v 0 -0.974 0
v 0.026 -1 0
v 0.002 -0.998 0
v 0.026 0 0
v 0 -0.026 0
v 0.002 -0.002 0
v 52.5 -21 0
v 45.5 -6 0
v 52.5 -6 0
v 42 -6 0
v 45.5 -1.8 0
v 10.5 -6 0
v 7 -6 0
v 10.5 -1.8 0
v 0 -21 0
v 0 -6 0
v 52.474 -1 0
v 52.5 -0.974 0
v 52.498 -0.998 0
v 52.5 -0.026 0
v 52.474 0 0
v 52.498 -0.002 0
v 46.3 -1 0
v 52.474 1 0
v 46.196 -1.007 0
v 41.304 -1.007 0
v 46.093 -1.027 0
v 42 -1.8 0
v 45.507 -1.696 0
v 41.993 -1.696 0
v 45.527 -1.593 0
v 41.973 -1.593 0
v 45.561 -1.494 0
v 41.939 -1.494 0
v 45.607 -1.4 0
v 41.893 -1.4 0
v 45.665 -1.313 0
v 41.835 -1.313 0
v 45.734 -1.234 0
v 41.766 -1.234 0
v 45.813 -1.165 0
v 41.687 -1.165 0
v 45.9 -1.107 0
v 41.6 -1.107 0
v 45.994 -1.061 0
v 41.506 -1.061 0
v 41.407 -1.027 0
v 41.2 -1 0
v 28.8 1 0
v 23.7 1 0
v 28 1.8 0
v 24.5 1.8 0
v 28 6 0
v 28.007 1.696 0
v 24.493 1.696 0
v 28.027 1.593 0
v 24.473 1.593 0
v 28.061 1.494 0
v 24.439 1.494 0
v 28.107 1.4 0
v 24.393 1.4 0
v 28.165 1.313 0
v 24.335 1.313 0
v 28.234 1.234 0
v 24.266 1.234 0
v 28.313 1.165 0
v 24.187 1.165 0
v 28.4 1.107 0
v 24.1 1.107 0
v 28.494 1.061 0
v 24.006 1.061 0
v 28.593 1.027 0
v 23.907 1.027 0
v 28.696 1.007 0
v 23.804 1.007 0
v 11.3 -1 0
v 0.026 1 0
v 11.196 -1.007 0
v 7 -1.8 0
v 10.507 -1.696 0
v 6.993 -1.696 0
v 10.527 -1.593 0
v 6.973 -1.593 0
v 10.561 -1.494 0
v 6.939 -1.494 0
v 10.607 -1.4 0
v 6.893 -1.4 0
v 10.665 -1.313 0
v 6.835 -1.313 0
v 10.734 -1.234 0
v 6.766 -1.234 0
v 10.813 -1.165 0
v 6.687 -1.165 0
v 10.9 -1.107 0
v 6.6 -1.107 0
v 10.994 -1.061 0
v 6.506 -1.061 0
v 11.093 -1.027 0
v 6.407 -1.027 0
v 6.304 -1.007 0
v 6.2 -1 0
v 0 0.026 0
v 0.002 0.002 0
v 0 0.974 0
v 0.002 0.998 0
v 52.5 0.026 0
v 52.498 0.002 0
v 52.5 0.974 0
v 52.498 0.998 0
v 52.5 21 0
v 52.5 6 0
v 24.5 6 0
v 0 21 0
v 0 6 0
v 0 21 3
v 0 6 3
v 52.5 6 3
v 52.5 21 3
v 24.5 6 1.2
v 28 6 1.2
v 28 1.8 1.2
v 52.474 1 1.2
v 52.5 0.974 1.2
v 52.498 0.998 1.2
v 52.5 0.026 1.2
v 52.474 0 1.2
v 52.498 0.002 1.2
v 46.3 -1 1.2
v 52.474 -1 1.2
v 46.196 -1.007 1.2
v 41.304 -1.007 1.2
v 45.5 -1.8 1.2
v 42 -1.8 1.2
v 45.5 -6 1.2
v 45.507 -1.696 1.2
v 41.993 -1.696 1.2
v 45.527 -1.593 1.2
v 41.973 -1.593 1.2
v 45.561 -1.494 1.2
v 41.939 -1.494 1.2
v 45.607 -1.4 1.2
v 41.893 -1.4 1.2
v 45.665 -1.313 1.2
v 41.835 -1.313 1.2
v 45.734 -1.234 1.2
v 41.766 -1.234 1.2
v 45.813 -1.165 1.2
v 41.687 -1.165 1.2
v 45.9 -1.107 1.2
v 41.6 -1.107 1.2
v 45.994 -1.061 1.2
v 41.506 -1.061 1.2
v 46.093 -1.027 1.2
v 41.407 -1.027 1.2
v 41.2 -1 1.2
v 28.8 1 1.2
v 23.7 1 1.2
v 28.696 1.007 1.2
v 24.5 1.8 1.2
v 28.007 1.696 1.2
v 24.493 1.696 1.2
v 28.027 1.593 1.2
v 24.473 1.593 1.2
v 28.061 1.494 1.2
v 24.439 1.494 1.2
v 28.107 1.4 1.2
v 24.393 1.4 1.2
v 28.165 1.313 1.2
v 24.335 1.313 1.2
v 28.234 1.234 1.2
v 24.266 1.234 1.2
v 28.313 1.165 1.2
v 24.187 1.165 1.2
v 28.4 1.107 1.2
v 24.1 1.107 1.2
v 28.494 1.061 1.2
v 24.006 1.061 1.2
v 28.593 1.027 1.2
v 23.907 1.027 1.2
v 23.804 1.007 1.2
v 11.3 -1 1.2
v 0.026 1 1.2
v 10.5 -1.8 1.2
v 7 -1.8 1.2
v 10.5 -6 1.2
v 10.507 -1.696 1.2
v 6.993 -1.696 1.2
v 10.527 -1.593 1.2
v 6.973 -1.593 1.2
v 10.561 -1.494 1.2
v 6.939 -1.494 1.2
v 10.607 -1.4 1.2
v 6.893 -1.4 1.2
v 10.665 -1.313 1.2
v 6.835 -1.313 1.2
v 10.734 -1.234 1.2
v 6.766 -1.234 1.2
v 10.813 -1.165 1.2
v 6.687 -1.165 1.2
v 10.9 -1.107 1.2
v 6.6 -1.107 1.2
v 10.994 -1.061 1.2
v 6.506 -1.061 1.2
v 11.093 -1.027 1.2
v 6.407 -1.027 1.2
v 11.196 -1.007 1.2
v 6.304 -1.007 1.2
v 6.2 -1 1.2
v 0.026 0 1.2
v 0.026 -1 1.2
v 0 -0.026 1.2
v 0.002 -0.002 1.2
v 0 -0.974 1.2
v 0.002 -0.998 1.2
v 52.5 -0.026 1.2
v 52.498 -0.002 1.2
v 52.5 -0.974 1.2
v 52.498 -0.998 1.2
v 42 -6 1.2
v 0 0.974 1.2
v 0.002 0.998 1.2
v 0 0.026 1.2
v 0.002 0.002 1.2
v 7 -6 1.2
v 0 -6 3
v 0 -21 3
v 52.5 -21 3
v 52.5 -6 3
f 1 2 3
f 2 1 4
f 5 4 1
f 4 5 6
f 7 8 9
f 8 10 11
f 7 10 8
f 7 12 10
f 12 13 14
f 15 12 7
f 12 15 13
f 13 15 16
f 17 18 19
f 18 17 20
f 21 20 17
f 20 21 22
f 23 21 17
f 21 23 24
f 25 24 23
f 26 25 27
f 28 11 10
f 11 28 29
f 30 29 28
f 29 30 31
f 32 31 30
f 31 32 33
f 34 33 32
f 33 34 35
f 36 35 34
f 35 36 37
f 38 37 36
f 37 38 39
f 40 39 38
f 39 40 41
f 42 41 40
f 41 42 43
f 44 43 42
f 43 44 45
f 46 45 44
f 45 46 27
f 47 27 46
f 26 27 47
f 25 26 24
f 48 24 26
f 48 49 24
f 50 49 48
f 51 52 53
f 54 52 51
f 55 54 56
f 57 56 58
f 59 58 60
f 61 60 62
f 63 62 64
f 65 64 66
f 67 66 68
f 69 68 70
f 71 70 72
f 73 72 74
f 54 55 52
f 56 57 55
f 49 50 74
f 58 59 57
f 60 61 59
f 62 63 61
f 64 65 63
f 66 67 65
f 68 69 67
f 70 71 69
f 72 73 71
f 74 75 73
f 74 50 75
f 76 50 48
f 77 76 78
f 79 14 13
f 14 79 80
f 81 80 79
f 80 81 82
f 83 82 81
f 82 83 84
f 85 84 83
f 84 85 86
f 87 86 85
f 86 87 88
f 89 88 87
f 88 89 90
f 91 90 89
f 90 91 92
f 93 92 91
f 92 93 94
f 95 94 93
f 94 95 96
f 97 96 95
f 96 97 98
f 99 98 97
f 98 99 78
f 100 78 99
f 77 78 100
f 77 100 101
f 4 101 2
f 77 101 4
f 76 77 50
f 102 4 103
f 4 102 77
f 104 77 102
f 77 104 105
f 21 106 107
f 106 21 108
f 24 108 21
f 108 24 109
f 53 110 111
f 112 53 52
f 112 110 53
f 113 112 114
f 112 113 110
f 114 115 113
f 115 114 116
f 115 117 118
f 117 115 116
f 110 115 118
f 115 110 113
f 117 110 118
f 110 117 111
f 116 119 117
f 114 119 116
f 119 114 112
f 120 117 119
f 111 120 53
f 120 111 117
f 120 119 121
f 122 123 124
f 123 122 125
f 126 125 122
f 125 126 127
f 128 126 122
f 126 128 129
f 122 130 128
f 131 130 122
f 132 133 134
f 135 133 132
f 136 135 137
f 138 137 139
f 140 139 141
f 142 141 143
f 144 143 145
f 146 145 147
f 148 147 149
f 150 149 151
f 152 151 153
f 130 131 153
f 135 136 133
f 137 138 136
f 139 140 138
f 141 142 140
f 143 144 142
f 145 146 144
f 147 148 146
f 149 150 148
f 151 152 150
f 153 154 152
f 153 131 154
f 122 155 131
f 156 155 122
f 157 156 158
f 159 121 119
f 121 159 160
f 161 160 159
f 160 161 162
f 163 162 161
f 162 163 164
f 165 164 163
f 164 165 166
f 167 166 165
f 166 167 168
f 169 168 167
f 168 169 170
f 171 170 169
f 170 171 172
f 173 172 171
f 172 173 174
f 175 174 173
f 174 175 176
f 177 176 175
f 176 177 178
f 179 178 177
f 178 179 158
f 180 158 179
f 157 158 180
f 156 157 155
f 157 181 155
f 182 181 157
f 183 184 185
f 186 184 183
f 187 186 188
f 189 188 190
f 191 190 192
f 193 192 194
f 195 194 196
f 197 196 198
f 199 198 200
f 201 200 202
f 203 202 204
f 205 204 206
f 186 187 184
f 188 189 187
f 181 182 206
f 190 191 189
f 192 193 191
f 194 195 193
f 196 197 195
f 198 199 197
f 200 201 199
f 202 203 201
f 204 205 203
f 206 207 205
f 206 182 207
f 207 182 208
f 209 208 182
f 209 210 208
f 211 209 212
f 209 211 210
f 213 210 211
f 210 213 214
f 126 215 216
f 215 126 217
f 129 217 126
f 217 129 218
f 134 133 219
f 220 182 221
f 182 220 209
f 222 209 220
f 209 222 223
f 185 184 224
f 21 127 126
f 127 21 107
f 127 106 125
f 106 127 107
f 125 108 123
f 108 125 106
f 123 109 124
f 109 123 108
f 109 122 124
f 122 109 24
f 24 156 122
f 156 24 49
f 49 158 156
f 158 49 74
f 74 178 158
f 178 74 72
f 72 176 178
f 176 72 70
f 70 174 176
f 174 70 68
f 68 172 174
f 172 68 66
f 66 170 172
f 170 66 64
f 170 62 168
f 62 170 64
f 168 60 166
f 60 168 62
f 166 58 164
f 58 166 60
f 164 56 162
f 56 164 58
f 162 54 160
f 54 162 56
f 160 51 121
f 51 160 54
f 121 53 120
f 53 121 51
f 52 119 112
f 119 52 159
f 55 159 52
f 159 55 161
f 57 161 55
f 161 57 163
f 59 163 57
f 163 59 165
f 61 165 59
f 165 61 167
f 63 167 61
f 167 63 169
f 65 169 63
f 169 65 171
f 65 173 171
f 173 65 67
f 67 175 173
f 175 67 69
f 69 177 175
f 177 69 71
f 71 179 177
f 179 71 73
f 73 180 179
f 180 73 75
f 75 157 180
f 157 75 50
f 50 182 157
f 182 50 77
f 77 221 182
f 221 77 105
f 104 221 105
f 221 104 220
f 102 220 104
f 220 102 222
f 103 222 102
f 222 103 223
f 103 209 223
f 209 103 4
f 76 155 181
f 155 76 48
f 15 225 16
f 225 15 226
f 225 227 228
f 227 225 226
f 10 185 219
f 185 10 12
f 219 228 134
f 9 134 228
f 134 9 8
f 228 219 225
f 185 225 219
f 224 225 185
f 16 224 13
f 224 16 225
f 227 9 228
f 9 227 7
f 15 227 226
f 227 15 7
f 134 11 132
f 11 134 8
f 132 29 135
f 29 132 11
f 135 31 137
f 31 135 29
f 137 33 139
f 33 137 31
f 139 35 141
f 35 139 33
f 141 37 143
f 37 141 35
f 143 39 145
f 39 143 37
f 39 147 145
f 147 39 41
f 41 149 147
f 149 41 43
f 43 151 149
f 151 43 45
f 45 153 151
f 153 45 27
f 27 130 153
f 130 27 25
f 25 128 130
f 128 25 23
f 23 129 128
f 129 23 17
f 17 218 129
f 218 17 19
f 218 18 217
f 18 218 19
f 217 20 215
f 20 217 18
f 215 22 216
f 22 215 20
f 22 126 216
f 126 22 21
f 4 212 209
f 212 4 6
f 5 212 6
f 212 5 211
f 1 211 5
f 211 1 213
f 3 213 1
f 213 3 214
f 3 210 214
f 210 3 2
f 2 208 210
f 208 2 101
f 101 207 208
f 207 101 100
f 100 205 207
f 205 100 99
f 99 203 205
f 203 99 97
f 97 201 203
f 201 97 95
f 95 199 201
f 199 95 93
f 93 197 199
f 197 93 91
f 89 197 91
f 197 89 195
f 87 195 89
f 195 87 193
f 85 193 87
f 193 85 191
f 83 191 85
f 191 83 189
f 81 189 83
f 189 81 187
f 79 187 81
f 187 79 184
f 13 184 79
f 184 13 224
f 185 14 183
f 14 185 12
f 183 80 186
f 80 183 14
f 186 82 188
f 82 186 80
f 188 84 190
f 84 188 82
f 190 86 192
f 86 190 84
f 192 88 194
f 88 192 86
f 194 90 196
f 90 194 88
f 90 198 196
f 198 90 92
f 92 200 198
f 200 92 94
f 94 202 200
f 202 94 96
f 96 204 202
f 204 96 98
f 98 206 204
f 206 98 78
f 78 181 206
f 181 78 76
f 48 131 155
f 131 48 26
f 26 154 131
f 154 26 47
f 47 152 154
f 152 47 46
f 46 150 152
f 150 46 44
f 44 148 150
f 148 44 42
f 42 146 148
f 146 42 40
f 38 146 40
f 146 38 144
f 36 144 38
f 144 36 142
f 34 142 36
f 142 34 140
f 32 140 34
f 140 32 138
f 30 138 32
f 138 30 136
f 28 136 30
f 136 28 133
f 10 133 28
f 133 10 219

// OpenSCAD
// file: let-folding-panel.scad
// let-folding-panel — two panels joined by a Lamina-Emergent Torsional (LET)
// joint: a compliant hinge fabricated FLAT from a single sheet that folds up
// to ~90°. Reference design for docs/advanced-techniques.md Domain 1
// (compliant mechanisms), the lamina-emergent family — "the best FDM match"
// per the doc — and CC1 (orientation): it is flat by nature, so the flex is in
// the layer plane by construction.
//
// How a LET works, and how this models it. The fold line runs along X at y = 0.
// A thin TORSION BAR lies on that line, split half into each panel's group.
// Each panel reaches the bar only through a row of FINGERS, and the two rows
// are interdigitated — A-fingers at even pitches, B-fingers at odd. Fold the
// panels about X and adjacent fingers pull the bar in opposite Z directions, so
// each bar segment *between* two fingers TWISTS (torsion) — most of the
// compliance, which is what makes a LET high-ROM where a plain living hinge
// would crack. The parameterization below is the doc's: t (dominant, t^3),
// free span L, bar width w, root fillet r >= 0.5*t, target angle theta_max;
// main() echoes the predicted joint stiffness K and the root stress numbers.
//
// The hinge zone (bar + fingers) is printed THIN (t) while the panels stay at
// panel_t, so the compliance is concentrated in the joint, not the panels.
// Every finger root carries an in-plane fillet r (the doc's stress-rule),
// realised as a morphological closing on the hinge silhouette. Everything
// prints flat, no supports. All dimensions in millimeters.
//
// NOTE: `demo_fold` rotates panel B's group for the preview only. The PRINTED
// part is always flat (demo_fold = 0); a folded model is not a printable model.

/* [Panels] */
// Panel width along the fold line, X (mm)
hinge_w = 70;
// Each panel's depth away from the hinge, Y (mm)
panel_d = 45;
// Panel sheet thickness, Z (mm) — the rigid members; only the hinge zone is thin
panel_t = 3.0;

/* [LET joint — the doc's knobs] */
// Torsion-bar thickness, Z (mm) — THE dominant knob (stiffness ~ t^3). Floor
// 0.8 = repo minimum feature (2 extrusion widths at 0.4 nozzle).
t = 1.2;
// Free torsion span between adjacent finger attachments, X (mm) — longer bar
// twists at lower strain; with w this sets the fold-life trade.
L = 14;
// Torsion-bar width across the fold line, Y (mm)
w = 2.0;
// Root fillet at every finger↔bar junction (mm) — doc rule: r >= 0.5*t
r = 0.8;
// Target fold angle (deg) — what the echoed predictions are quoted at
theta_max = 90;
// Total interdigitated fingers (alternating A/B, so keep >= 3)
fingers = 4;
// Finger width along X (mm)
finger_w = 3.5;
// Finger run from panel edge across the fold line, Y (mm)
finger_reach = 6;

/* [Preview only] */
// Fold angle for the preview pose (deg). PRINT AT 0.
demo_fold = 0; // [0:5:110]

/* [Quality] */
$fn = 48;

// ---- derived -----------------------------------------------------------
// pitch is built FROM L so the free span is exactly the L you set (a realized
// dimension, not a nominal one); the bar spans fingers*pitch, flush with the
// panels at the defaults.
pitch     = finger_w + L;
strip_len = fingers * pitch;
g         = finger_reach;      // panel inner edges sit at y = ∓g
n_spans   = fingers - 1;       // torsion spans, all twisted by the fold angle

// morphological closing: rounds every concave (root) corner with radius r,
// leaves convex corners and the silhouette otherwise untouched.
module rooted_2d() {
    offset(r = -r) offset(r = r) children();
}

module panel_A_2d() {
    translate([0, -g - panel_d]) square([hinge_w, panel_d]);
}
module panel_B_2d() {
    translate([0, g]) square([hinge_w, panel_d]);
}

// A-side hinge silhouette: the near half of the torsion bar plus A's fingers
// (even slots), each embedded 1 mm into its panel for a robust union.
module hinge_A_2d() {
    rooted_2d() {
        translate([0, -w / 2]) square([strip_len, w / 2]);
        for (i = [0 : fingers - 1])
            if (i % 2 == 0) {
                x0 = i * pitch + (pitch - finger_w) / 2;
                translate([x0, -g - 1]) square([finger_w, g + 1 + w / 2]);
            }
    }
}
// B-side hinge silhouette: the far half of the bar plus B's fingers (odd
// slots), likewise embedded. Both halves carry their own root fillets, so the
// joint is symmetric in stress as well as in shape.
module hinge_B_2d() {
    rooted_2d() {
        translate([0, 0]) square([strip_len, w / 2]);
        for (i = [0 : fingers - 1])
            if (i % 2 == 1) {
                x0 = i * pitch + (pitch - finger_w) / 2;
                translate([x0, -w / 2]) square([finger_w, w / 2 + g + 1]);
            }
    }
}

// Predictions per the doc's governing relations — calibration starting points
// for the coupon, never a guarantee (that is what the coupon is for).
module echo_predictions() {
    E  = 2000;                  // PETG modulus, MPa (assumed — see NOTES.md)
    nu = 0.4;
    Gs = E / (2 * (1 + nu));    // shear modulus, MPa
    th = theta_max * PI / 180;  // rad
    // St-Venant torsion constant of the w × t rectangular bar, mm^4
    J  = w * t^3 / 3 * (1 - 0.63 * (t / w) + 0.052 * (t / w)^5);
    K_bar = Gs * J / L;               // N·mm/rad — one span
    K_tot = n_spans * K_bar;          // spans act in parallel across X
    L_bend = g - w / 2;               // finger-root bending length, mm
    sigma  = E * t * th / (2 * L_bend);  // doc: sigma ~ E·t·θ / (2L), MPa
    r_c = sqrt((w / 2)^2 + (t / 2)^2);   // corner fiber distance from the axis
    tau = Gs * th * r_c / L;            // torsion surface shear, MPa
    echo(str("LET predictions @ theta_max=", theta_max, "deg (E=", E,
             " MPa assumed): K_joint = ", K_tot, " N·mm/rad (", n_spans,
             " spans x ", K_bar, "), sigma_root = ", sigma,
             " MPa (doc upper bound if a root took the full fold), tau_bar = ",
             tau, " MPa (the design stress here — torsion dominates).",
             " Coupon arbitrates; these are starting points."));
}

module main() {
    assert(t >= 0.8, "torsion bar under the 0.8 mm minimum feature");
    assert(r >= 0.5 * t, "root fillet violates the doc rule r >= 0.5*t");
    assert(w >= 1.2, "torsion bar under 3 perimeters — it will tear");
    assert(L > 2 * r, "no free torsion span left after the root fillets");
    assert(fingers >= 3, "a LET needs at least 2 fingers on one side");
    assert(g > w / 2 + 2, "fingers too short to bridge the panels");
    echo_predictions();

    // fixed group: panel A and its half of the bar + A's fingers, all flat
    linear_extrude(panel_t) panel_A_2d();
    linear_extrude(t) hinge_A_2d();

    // moving group: panel B, its half-bar and its fingers, folded for preview
    rotate([demo_fold, 0, 0]) {
        linear_extrude(panel_t) panel_B_2d();
        linear_extrude(t) hinge_B_2d();
    }
}

main();
// main file
// Tuned-flexure coupon (PRINT THIS FIRST): the production LET joint at hand
// scale — 2 A-fingers + 1 B-finger, so 2 real torsion spans, straight from
// the production modules (nothing copied). Fold it to 90° and cycle it ~50
// times; it should fold smooth and hold. Feels wrong? Stiffness is t^3 —
// tune t in ±0.2 steps (sweep in NOTES.md "Print this first"); TEARING is
// strain (θ·r/L), so fix tears by lengthening L (drop a finger) or narrowing
// w, not by thickening t.
include <let-folding-panel.scad>
fingers = 3;     // one full torsion pair
hinge_w = 52.5;  // = 3 × pitch — panels end flush with the bar
panel_d = 15;    // short panels: the joint is what you are testing
